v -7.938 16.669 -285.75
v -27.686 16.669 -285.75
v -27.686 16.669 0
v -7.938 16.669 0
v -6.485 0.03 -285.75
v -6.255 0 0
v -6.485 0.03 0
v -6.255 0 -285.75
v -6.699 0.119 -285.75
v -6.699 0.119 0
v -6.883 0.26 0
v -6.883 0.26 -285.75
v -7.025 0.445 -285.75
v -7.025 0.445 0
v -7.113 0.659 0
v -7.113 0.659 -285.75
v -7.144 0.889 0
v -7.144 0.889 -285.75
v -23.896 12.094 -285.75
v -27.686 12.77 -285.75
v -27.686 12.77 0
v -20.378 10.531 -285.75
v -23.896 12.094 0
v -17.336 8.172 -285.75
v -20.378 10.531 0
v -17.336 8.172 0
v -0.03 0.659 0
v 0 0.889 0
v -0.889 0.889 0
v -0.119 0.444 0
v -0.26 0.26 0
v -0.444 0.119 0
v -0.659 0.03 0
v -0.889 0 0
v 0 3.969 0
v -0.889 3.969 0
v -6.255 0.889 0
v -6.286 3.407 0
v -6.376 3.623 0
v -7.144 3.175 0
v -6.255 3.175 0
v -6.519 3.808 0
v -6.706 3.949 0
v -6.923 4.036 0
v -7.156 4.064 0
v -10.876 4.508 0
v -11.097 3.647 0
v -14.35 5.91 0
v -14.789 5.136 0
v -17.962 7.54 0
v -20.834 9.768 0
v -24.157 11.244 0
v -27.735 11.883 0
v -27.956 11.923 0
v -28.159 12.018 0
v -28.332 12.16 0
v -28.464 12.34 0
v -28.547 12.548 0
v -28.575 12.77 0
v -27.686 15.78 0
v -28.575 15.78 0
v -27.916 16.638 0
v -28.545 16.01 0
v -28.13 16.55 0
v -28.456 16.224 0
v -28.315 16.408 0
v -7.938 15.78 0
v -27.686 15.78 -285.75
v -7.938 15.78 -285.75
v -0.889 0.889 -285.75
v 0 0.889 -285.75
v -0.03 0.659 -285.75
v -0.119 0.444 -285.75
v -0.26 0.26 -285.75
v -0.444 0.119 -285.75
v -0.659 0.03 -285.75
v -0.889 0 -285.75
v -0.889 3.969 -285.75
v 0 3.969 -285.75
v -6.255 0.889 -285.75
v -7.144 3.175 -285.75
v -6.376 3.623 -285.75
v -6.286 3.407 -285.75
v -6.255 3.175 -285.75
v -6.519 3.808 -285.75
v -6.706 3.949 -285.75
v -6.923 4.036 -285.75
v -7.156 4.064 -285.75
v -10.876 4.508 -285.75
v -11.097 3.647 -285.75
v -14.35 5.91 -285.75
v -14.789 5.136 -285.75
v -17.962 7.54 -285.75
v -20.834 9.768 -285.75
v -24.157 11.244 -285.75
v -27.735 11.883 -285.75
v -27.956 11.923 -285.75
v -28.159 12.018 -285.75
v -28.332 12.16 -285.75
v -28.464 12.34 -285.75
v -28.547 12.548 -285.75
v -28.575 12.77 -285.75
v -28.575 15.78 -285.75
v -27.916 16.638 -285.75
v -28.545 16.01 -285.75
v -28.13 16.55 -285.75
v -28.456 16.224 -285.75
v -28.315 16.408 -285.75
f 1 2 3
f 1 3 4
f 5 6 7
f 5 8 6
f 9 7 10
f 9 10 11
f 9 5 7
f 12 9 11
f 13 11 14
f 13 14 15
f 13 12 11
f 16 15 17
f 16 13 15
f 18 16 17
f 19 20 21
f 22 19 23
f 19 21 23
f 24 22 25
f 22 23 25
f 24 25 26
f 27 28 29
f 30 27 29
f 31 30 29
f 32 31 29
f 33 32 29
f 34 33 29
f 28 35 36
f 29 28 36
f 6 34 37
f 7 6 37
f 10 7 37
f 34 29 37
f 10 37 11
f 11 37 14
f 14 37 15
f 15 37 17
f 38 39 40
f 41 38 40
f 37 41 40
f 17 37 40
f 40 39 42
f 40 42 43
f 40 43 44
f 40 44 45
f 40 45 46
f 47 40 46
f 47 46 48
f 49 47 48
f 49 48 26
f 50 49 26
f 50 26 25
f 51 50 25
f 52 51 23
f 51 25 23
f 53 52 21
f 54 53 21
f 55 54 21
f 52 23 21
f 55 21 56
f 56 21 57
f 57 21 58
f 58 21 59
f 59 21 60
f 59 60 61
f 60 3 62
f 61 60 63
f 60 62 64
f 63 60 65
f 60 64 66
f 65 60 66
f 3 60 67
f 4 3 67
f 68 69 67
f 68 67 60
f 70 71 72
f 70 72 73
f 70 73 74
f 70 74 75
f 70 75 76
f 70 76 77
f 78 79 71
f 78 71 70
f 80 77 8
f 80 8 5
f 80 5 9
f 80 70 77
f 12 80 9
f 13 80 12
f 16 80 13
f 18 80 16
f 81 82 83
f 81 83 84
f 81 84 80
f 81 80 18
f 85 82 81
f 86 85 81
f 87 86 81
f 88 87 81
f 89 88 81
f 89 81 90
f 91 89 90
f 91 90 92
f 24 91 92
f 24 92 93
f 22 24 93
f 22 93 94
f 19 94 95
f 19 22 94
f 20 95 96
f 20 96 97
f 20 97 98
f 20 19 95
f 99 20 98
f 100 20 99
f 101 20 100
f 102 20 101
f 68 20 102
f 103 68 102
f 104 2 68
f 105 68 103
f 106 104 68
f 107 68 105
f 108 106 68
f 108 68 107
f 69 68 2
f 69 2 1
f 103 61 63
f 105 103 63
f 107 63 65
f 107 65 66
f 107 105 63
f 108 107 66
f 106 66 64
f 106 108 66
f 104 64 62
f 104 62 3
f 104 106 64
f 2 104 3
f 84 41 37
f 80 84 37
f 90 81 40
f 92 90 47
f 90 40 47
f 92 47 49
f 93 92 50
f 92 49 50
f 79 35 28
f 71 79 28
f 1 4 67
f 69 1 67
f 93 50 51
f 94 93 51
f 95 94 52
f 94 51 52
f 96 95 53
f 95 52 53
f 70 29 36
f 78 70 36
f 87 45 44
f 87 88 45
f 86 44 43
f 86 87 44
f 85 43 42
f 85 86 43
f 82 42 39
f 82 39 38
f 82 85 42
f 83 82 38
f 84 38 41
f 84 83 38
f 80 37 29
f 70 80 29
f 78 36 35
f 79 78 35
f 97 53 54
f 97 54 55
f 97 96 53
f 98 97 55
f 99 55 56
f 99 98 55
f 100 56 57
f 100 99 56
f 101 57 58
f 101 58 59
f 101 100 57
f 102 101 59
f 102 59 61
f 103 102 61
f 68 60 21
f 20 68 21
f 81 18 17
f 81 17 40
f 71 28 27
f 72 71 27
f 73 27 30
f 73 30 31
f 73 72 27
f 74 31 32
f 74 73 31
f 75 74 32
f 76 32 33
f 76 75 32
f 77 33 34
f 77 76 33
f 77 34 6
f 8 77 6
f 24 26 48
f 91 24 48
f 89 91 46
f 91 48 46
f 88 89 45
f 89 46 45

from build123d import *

# Parameters (mm, degrees)
EXTRUDE_THIN1_DEPTH = 285.75
FILLET1_R           = 0.889


with BuildPart() as part:
    # Sketch1 → Extrude-Thin1 (new body)
    with BuildSketch(Plane.XY):
        with BuildLine():
            Line((0, 3.96875), (0, 0))
            Line((0, 0), (-7.14375, 0))
            Line((-7.14375, 0), (-7.14375, 3.175))
            ThreePointArc((-7.14375, 3.175), (-12.992038746, 4.269087389), (-17.962061345, 7.539925789))
            ThreePointArc((-17.962061345, 7.539925789), (-22.83698523, 10.772017174), (-28.575, 11.90625))
            Line((-28.575, 11.90625), (-28.575, 16.66875))
            Line((-28.575, 16.66875), (-7.9375, 16.66875))
            Line((-7.9375, 16.66875), (-7.9375, 15.77975))
            Line((-7.9375, 15.77975), (-27.686, 15.77975))
            Line((-27.686, 15.77975), (-27.686, 12.770487263))
            ThreePointArc((-27.686, 12.770487263), (-22.089870787, 11.419244899), (-17.33645654, 8.171542467))
            ThreePointArc((-17.33645654, 8.171542467), (-12.238465129, 4.931402679), (-6.25475, 4.104858346))
            Line((-6.25475, 4.104858346), (-6.25475, 0.889))
            Line((-6.25475, 0.889), (-0.889, 0.889))
            Line((-0.889, 0.889), (-0.889, 3.96875))
            Line((-0.889, 3.96875), (0, 3.96875))
        make_face()
    extrude(amount=-EXTRUDE_THIN1_DEPTH)

    # Fillet1
    fillet1_edges = [part.edges().sort_by_distance(p)[0] for p in [
        (-6.25475, 4.104858346, -142.875),
        (0, 0, -142.875),
        (-7.14375, 0, -142.875),
        (-28.575, 11.90625, -142.875),
        (-28.575, 16.66875, -142.875),
    ]]
    fillet(fillet1_edges, radius=FILLET1_R)


solid = part.part
